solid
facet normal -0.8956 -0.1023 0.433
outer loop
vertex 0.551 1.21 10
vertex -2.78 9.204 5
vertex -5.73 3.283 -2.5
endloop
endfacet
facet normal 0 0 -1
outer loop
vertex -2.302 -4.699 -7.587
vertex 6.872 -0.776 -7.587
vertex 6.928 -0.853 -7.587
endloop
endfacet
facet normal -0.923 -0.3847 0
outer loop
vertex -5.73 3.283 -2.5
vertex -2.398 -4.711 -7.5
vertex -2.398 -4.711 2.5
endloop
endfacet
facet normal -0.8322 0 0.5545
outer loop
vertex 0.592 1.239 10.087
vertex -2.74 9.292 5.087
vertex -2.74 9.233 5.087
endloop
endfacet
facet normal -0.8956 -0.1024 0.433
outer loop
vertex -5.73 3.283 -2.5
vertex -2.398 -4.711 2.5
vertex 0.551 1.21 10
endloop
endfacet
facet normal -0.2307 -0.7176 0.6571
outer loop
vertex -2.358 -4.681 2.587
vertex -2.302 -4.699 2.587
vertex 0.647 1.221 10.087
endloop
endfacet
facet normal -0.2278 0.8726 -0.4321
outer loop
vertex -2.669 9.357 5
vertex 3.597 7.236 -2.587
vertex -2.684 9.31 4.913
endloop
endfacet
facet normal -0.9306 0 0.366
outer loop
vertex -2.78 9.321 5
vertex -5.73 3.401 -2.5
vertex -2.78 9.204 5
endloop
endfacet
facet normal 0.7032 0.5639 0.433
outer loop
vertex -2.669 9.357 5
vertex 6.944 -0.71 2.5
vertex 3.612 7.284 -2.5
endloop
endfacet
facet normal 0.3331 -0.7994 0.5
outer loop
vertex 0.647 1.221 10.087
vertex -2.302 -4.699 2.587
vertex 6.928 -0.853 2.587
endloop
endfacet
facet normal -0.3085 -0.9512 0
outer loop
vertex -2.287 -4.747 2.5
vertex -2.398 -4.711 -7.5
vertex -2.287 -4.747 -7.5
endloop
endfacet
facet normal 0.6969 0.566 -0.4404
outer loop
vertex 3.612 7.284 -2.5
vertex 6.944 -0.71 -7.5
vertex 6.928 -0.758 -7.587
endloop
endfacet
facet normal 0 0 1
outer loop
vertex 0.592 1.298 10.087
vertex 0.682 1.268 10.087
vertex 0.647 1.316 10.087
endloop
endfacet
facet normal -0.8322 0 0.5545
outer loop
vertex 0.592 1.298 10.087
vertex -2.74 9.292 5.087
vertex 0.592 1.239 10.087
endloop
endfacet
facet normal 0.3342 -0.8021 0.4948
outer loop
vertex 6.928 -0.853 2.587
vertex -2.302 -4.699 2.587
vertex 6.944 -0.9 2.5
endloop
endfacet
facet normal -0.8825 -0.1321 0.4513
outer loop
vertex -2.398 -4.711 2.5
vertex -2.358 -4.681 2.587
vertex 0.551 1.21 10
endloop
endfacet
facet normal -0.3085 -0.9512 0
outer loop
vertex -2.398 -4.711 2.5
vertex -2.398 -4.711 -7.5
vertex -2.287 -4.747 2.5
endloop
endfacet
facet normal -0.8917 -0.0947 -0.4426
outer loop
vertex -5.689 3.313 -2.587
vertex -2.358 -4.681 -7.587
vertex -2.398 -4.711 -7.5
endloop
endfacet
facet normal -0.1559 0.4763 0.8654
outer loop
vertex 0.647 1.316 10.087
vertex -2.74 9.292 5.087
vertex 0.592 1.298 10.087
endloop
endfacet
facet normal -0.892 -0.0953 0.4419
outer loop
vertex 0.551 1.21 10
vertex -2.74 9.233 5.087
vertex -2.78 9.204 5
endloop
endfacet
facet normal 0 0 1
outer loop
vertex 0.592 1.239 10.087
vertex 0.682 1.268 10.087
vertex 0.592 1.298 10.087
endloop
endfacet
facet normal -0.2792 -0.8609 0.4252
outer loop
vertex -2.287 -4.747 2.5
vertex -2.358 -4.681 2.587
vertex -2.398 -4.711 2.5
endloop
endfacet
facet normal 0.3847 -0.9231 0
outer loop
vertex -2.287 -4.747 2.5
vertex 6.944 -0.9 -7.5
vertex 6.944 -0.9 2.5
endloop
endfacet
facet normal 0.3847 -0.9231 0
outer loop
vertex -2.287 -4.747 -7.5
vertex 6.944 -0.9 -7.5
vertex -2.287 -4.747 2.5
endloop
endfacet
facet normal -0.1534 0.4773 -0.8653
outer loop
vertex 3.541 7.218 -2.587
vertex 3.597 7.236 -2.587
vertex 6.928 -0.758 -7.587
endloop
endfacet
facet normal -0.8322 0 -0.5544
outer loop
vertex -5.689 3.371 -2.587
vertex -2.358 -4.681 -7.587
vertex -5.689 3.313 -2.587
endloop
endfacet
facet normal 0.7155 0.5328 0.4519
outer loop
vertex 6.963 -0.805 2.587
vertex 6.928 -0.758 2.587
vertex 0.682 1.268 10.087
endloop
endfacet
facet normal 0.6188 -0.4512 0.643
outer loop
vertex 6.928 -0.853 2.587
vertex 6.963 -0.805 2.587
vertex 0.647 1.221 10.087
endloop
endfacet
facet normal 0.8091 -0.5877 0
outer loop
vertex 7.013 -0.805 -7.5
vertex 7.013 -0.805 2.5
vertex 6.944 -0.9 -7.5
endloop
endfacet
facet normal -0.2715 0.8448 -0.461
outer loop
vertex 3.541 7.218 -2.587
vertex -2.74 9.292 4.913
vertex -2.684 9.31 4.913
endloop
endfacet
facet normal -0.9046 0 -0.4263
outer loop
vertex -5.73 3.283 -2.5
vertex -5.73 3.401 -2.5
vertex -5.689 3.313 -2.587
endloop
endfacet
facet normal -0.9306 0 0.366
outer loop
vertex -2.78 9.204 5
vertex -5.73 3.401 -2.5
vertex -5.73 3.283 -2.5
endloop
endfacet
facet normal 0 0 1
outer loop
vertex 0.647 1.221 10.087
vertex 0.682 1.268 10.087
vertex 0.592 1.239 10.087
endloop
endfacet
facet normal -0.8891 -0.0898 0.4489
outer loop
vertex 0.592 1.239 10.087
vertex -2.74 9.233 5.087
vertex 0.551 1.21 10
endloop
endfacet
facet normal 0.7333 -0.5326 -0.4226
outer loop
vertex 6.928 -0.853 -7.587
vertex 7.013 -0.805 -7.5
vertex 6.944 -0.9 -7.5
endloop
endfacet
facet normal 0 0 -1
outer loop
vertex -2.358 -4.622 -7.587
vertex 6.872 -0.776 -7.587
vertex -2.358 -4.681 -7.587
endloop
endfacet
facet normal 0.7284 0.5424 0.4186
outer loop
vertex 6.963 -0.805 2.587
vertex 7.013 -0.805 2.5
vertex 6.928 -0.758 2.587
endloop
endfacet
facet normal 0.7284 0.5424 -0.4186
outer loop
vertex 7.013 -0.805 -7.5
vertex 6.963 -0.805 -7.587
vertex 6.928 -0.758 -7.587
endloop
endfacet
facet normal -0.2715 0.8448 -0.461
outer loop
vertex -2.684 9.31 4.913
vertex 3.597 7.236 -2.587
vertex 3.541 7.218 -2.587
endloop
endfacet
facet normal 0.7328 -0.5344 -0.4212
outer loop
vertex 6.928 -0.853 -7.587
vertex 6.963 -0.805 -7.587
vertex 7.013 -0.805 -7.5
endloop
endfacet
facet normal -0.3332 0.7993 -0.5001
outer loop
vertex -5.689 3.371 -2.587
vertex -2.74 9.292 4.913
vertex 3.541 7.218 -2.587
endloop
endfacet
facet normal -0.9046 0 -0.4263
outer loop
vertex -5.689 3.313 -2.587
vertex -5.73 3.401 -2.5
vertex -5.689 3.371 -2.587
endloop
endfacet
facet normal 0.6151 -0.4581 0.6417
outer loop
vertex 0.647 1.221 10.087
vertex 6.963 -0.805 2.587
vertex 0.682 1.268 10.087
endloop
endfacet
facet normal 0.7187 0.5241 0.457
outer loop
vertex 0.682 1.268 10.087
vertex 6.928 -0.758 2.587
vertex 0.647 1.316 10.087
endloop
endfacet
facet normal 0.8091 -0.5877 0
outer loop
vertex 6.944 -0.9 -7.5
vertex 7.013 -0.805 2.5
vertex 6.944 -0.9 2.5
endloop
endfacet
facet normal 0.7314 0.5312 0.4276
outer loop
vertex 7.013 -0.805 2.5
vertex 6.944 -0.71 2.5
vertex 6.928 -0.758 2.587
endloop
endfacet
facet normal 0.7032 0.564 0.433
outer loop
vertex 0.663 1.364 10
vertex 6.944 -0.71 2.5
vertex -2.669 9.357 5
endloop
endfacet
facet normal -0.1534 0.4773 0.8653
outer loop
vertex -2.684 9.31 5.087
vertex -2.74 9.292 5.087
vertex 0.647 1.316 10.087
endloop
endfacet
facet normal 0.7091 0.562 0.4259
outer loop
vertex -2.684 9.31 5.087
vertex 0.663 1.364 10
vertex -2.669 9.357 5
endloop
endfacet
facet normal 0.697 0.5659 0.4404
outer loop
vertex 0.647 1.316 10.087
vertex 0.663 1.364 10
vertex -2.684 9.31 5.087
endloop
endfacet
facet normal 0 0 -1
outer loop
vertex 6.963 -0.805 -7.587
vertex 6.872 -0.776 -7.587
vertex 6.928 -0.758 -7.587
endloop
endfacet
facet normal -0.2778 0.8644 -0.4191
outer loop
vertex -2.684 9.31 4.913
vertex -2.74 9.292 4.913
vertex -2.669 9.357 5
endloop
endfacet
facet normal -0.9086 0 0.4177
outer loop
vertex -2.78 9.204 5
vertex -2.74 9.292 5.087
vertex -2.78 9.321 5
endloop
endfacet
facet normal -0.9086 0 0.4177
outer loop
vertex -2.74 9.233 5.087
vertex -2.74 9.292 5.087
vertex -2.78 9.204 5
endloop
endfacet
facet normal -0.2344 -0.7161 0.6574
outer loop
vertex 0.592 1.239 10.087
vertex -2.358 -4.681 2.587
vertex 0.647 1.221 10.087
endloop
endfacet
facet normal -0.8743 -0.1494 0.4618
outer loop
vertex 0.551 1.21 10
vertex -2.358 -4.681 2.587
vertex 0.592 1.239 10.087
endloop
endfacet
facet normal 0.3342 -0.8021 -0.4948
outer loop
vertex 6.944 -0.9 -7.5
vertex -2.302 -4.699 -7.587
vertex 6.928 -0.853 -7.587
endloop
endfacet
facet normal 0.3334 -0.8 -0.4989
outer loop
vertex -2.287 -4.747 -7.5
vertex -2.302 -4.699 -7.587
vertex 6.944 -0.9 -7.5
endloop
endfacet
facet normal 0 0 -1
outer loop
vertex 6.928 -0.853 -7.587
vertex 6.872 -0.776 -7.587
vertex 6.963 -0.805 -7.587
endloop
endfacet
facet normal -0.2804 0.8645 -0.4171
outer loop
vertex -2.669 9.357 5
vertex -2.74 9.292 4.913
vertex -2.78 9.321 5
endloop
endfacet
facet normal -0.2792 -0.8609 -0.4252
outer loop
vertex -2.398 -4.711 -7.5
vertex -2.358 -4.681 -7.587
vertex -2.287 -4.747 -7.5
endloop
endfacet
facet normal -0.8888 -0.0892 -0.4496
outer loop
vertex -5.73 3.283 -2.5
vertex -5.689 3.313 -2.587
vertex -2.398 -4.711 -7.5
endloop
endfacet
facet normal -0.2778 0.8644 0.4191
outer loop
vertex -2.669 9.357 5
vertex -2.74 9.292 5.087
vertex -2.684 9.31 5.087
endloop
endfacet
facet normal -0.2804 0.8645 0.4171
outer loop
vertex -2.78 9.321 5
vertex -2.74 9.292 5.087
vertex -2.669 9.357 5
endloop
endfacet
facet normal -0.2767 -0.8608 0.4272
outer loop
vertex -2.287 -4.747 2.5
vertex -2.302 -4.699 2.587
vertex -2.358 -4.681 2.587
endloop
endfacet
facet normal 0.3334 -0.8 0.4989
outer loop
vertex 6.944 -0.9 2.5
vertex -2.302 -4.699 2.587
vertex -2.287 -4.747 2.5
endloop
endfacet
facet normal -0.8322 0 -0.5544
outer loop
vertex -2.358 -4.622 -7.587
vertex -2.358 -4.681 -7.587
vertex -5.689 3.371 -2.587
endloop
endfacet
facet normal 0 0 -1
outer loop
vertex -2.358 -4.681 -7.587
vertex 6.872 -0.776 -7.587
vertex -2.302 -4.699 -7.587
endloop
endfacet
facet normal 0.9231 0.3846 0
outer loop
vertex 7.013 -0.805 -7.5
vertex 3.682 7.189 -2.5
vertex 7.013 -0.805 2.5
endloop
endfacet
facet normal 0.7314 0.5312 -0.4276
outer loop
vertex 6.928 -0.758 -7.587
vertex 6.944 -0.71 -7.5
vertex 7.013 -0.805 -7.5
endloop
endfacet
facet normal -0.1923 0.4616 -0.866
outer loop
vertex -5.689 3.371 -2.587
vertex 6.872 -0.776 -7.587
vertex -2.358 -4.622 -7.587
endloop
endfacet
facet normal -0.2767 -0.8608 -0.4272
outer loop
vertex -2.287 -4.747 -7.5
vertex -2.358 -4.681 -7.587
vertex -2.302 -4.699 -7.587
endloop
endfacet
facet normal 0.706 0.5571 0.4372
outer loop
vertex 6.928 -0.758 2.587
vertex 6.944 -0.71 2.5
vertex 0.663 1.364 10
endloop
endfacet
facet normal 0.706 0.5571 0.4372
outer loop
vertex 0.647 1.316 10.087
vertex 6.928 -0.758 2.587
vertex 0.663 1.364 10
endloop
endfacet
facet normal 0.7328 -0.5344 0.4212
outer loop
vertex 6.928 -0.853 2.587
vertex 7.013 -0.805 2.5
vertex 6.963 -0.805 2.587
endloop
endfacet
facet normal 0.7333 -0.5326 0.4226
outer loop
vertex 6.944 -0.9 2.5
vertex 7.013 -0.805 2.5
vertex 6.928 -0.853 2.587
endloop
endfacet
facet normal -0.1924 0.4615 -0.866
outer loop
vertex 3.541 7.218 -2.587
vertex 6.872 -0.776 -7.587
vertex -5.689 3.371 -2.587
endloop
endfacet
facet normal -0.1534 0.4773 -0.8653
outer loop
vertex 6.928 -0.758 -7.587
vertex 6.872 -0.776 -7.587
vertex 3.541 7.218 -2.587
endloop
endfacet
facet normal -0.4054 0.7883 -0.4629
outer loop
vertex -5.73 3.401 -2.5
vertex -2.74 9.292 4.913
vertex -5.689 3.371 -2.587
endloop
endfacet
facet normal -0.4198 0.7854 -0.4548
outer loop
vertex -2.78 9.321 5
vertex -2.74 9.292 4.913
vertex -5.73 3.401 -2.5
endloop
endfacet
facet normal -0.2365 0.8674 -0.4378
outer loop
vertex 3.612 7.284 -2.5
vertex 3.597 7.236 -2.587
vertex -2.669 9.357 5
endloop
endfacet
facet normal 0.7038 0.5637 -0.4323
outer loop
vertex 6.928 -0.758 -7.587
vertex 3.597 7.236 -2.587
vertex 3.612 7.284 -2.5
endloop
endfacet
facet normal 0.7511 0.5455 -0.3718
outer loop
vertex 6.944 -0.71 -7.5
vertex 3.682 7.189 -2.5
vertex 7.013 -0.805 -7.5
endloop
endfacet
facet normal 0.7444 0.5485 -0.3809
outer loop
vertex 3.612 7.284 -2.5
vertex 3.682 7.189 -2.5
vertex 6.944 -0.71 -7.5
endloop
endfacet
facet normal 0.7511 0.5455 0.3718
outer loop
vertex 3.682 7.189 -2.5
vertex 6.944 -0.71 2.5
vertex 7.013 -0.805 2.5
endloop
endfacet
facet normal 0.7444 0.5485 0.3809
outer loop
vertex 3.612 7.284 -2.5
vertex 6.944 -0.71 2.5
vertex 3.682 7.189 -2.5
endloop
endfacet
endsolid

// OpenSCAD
// Auto-generated OpenSCAD file

    inner_points = 10*[[0.06319597715687762, 0.1268463153899368, 1.0], [-0.2699443063437531, 0.9262320492567245, 0.5000000000006233], [0.691291687541074, -0.08050791918503769, -0.750000000000228], [-0.2317594497271782, -0.4651851838989617, -0.7500000000003951], [0.6912916875411965, -0.08050791918576636, 0.24999999999977196], [-0.23175944972705564, -0.4651851838996903, 0.24999999999960476], [0.3581514040405658, 0.7188778146810213, -0.24999999999960476], [-0.5648997332276864, 0.33420054996709736, -0.24999999999977196]];

    outer_points = 10*[[-0.4257137914058795, -0.8544883437355262, -0.29768681231614647], [0.20766159975206822, -0.8544883437355262, 0.47615788390882396], [0.490793922669076, 0.7731461234147987, -0.40170436557220773], [-0.27274173101526467, 0.9358305640562536, 0.22323329397953012], [0.06508013126319645, -0.08134222032072741, -0.6993911778883541], [-0.6984555224211442, 0.08134222032072741, -0.07445351833661629], [0.6984555224211442, -0.08134222032072741, 0.07445351833661629], [-0.06508013126319645, 0.08134222032072741, 0.6993911778883541]];

    // Convex hull for inner set (I)
    module inner_hull() {
        hull() {
            for (p = inner_points) {
                translate(p) sphere(r=0.1);
            }
        }
    }

    // Convex hull for outer set (O) minus inner hull (O \ I)
    module outer_minus_inner() {
        difference() {
            hull() {
                for (p = outer_points) {
                    translate(p) sphere(r=0.1);
                }
            }
            inner_hull(); // Subtract inner hull
        }
    }

    // Convex hull for outer set (O) minus all translated inner hulls
    module outer_minus_AllTranslationInner() {
        difference() {
            hull() {
                for (p = outer_points) {
                    translate(p) sphere(r=0.1);
                }
            }
            hull() {
                translate([0,0,50]) inner_hull();
                translate([0,0,-50]) inner_hull();
            }; // Subtract translated inner hulls
        }
    }

    // Difference between outer_minus_inner and outer_minus_AllTranslationInner
    module outer_minus_inner_diff() {
        difference() {
            // Outer minus inner
            difference() {
                hull() {
                    for (p = outer_points) {
                        translate(p) sphere(r=0.1);
                    }
                }
                inner_hull();
            }

            // Subtract Outer minus AllTranslationInner
            difference() {
                hull() {
                    for (p = outer_points) {
                        translate(p) sphere(r=0.1);
                    }
                }
                hull() {
                    translate([0,0,50]) inner_hull();
                    translate([0,0,-50]) inner_hull();
                };
            }
        }
    }

    // Rendering all with colors applied
    color([1, 0, 0, 0.5]) inner_hull(); // Transparent red
    
